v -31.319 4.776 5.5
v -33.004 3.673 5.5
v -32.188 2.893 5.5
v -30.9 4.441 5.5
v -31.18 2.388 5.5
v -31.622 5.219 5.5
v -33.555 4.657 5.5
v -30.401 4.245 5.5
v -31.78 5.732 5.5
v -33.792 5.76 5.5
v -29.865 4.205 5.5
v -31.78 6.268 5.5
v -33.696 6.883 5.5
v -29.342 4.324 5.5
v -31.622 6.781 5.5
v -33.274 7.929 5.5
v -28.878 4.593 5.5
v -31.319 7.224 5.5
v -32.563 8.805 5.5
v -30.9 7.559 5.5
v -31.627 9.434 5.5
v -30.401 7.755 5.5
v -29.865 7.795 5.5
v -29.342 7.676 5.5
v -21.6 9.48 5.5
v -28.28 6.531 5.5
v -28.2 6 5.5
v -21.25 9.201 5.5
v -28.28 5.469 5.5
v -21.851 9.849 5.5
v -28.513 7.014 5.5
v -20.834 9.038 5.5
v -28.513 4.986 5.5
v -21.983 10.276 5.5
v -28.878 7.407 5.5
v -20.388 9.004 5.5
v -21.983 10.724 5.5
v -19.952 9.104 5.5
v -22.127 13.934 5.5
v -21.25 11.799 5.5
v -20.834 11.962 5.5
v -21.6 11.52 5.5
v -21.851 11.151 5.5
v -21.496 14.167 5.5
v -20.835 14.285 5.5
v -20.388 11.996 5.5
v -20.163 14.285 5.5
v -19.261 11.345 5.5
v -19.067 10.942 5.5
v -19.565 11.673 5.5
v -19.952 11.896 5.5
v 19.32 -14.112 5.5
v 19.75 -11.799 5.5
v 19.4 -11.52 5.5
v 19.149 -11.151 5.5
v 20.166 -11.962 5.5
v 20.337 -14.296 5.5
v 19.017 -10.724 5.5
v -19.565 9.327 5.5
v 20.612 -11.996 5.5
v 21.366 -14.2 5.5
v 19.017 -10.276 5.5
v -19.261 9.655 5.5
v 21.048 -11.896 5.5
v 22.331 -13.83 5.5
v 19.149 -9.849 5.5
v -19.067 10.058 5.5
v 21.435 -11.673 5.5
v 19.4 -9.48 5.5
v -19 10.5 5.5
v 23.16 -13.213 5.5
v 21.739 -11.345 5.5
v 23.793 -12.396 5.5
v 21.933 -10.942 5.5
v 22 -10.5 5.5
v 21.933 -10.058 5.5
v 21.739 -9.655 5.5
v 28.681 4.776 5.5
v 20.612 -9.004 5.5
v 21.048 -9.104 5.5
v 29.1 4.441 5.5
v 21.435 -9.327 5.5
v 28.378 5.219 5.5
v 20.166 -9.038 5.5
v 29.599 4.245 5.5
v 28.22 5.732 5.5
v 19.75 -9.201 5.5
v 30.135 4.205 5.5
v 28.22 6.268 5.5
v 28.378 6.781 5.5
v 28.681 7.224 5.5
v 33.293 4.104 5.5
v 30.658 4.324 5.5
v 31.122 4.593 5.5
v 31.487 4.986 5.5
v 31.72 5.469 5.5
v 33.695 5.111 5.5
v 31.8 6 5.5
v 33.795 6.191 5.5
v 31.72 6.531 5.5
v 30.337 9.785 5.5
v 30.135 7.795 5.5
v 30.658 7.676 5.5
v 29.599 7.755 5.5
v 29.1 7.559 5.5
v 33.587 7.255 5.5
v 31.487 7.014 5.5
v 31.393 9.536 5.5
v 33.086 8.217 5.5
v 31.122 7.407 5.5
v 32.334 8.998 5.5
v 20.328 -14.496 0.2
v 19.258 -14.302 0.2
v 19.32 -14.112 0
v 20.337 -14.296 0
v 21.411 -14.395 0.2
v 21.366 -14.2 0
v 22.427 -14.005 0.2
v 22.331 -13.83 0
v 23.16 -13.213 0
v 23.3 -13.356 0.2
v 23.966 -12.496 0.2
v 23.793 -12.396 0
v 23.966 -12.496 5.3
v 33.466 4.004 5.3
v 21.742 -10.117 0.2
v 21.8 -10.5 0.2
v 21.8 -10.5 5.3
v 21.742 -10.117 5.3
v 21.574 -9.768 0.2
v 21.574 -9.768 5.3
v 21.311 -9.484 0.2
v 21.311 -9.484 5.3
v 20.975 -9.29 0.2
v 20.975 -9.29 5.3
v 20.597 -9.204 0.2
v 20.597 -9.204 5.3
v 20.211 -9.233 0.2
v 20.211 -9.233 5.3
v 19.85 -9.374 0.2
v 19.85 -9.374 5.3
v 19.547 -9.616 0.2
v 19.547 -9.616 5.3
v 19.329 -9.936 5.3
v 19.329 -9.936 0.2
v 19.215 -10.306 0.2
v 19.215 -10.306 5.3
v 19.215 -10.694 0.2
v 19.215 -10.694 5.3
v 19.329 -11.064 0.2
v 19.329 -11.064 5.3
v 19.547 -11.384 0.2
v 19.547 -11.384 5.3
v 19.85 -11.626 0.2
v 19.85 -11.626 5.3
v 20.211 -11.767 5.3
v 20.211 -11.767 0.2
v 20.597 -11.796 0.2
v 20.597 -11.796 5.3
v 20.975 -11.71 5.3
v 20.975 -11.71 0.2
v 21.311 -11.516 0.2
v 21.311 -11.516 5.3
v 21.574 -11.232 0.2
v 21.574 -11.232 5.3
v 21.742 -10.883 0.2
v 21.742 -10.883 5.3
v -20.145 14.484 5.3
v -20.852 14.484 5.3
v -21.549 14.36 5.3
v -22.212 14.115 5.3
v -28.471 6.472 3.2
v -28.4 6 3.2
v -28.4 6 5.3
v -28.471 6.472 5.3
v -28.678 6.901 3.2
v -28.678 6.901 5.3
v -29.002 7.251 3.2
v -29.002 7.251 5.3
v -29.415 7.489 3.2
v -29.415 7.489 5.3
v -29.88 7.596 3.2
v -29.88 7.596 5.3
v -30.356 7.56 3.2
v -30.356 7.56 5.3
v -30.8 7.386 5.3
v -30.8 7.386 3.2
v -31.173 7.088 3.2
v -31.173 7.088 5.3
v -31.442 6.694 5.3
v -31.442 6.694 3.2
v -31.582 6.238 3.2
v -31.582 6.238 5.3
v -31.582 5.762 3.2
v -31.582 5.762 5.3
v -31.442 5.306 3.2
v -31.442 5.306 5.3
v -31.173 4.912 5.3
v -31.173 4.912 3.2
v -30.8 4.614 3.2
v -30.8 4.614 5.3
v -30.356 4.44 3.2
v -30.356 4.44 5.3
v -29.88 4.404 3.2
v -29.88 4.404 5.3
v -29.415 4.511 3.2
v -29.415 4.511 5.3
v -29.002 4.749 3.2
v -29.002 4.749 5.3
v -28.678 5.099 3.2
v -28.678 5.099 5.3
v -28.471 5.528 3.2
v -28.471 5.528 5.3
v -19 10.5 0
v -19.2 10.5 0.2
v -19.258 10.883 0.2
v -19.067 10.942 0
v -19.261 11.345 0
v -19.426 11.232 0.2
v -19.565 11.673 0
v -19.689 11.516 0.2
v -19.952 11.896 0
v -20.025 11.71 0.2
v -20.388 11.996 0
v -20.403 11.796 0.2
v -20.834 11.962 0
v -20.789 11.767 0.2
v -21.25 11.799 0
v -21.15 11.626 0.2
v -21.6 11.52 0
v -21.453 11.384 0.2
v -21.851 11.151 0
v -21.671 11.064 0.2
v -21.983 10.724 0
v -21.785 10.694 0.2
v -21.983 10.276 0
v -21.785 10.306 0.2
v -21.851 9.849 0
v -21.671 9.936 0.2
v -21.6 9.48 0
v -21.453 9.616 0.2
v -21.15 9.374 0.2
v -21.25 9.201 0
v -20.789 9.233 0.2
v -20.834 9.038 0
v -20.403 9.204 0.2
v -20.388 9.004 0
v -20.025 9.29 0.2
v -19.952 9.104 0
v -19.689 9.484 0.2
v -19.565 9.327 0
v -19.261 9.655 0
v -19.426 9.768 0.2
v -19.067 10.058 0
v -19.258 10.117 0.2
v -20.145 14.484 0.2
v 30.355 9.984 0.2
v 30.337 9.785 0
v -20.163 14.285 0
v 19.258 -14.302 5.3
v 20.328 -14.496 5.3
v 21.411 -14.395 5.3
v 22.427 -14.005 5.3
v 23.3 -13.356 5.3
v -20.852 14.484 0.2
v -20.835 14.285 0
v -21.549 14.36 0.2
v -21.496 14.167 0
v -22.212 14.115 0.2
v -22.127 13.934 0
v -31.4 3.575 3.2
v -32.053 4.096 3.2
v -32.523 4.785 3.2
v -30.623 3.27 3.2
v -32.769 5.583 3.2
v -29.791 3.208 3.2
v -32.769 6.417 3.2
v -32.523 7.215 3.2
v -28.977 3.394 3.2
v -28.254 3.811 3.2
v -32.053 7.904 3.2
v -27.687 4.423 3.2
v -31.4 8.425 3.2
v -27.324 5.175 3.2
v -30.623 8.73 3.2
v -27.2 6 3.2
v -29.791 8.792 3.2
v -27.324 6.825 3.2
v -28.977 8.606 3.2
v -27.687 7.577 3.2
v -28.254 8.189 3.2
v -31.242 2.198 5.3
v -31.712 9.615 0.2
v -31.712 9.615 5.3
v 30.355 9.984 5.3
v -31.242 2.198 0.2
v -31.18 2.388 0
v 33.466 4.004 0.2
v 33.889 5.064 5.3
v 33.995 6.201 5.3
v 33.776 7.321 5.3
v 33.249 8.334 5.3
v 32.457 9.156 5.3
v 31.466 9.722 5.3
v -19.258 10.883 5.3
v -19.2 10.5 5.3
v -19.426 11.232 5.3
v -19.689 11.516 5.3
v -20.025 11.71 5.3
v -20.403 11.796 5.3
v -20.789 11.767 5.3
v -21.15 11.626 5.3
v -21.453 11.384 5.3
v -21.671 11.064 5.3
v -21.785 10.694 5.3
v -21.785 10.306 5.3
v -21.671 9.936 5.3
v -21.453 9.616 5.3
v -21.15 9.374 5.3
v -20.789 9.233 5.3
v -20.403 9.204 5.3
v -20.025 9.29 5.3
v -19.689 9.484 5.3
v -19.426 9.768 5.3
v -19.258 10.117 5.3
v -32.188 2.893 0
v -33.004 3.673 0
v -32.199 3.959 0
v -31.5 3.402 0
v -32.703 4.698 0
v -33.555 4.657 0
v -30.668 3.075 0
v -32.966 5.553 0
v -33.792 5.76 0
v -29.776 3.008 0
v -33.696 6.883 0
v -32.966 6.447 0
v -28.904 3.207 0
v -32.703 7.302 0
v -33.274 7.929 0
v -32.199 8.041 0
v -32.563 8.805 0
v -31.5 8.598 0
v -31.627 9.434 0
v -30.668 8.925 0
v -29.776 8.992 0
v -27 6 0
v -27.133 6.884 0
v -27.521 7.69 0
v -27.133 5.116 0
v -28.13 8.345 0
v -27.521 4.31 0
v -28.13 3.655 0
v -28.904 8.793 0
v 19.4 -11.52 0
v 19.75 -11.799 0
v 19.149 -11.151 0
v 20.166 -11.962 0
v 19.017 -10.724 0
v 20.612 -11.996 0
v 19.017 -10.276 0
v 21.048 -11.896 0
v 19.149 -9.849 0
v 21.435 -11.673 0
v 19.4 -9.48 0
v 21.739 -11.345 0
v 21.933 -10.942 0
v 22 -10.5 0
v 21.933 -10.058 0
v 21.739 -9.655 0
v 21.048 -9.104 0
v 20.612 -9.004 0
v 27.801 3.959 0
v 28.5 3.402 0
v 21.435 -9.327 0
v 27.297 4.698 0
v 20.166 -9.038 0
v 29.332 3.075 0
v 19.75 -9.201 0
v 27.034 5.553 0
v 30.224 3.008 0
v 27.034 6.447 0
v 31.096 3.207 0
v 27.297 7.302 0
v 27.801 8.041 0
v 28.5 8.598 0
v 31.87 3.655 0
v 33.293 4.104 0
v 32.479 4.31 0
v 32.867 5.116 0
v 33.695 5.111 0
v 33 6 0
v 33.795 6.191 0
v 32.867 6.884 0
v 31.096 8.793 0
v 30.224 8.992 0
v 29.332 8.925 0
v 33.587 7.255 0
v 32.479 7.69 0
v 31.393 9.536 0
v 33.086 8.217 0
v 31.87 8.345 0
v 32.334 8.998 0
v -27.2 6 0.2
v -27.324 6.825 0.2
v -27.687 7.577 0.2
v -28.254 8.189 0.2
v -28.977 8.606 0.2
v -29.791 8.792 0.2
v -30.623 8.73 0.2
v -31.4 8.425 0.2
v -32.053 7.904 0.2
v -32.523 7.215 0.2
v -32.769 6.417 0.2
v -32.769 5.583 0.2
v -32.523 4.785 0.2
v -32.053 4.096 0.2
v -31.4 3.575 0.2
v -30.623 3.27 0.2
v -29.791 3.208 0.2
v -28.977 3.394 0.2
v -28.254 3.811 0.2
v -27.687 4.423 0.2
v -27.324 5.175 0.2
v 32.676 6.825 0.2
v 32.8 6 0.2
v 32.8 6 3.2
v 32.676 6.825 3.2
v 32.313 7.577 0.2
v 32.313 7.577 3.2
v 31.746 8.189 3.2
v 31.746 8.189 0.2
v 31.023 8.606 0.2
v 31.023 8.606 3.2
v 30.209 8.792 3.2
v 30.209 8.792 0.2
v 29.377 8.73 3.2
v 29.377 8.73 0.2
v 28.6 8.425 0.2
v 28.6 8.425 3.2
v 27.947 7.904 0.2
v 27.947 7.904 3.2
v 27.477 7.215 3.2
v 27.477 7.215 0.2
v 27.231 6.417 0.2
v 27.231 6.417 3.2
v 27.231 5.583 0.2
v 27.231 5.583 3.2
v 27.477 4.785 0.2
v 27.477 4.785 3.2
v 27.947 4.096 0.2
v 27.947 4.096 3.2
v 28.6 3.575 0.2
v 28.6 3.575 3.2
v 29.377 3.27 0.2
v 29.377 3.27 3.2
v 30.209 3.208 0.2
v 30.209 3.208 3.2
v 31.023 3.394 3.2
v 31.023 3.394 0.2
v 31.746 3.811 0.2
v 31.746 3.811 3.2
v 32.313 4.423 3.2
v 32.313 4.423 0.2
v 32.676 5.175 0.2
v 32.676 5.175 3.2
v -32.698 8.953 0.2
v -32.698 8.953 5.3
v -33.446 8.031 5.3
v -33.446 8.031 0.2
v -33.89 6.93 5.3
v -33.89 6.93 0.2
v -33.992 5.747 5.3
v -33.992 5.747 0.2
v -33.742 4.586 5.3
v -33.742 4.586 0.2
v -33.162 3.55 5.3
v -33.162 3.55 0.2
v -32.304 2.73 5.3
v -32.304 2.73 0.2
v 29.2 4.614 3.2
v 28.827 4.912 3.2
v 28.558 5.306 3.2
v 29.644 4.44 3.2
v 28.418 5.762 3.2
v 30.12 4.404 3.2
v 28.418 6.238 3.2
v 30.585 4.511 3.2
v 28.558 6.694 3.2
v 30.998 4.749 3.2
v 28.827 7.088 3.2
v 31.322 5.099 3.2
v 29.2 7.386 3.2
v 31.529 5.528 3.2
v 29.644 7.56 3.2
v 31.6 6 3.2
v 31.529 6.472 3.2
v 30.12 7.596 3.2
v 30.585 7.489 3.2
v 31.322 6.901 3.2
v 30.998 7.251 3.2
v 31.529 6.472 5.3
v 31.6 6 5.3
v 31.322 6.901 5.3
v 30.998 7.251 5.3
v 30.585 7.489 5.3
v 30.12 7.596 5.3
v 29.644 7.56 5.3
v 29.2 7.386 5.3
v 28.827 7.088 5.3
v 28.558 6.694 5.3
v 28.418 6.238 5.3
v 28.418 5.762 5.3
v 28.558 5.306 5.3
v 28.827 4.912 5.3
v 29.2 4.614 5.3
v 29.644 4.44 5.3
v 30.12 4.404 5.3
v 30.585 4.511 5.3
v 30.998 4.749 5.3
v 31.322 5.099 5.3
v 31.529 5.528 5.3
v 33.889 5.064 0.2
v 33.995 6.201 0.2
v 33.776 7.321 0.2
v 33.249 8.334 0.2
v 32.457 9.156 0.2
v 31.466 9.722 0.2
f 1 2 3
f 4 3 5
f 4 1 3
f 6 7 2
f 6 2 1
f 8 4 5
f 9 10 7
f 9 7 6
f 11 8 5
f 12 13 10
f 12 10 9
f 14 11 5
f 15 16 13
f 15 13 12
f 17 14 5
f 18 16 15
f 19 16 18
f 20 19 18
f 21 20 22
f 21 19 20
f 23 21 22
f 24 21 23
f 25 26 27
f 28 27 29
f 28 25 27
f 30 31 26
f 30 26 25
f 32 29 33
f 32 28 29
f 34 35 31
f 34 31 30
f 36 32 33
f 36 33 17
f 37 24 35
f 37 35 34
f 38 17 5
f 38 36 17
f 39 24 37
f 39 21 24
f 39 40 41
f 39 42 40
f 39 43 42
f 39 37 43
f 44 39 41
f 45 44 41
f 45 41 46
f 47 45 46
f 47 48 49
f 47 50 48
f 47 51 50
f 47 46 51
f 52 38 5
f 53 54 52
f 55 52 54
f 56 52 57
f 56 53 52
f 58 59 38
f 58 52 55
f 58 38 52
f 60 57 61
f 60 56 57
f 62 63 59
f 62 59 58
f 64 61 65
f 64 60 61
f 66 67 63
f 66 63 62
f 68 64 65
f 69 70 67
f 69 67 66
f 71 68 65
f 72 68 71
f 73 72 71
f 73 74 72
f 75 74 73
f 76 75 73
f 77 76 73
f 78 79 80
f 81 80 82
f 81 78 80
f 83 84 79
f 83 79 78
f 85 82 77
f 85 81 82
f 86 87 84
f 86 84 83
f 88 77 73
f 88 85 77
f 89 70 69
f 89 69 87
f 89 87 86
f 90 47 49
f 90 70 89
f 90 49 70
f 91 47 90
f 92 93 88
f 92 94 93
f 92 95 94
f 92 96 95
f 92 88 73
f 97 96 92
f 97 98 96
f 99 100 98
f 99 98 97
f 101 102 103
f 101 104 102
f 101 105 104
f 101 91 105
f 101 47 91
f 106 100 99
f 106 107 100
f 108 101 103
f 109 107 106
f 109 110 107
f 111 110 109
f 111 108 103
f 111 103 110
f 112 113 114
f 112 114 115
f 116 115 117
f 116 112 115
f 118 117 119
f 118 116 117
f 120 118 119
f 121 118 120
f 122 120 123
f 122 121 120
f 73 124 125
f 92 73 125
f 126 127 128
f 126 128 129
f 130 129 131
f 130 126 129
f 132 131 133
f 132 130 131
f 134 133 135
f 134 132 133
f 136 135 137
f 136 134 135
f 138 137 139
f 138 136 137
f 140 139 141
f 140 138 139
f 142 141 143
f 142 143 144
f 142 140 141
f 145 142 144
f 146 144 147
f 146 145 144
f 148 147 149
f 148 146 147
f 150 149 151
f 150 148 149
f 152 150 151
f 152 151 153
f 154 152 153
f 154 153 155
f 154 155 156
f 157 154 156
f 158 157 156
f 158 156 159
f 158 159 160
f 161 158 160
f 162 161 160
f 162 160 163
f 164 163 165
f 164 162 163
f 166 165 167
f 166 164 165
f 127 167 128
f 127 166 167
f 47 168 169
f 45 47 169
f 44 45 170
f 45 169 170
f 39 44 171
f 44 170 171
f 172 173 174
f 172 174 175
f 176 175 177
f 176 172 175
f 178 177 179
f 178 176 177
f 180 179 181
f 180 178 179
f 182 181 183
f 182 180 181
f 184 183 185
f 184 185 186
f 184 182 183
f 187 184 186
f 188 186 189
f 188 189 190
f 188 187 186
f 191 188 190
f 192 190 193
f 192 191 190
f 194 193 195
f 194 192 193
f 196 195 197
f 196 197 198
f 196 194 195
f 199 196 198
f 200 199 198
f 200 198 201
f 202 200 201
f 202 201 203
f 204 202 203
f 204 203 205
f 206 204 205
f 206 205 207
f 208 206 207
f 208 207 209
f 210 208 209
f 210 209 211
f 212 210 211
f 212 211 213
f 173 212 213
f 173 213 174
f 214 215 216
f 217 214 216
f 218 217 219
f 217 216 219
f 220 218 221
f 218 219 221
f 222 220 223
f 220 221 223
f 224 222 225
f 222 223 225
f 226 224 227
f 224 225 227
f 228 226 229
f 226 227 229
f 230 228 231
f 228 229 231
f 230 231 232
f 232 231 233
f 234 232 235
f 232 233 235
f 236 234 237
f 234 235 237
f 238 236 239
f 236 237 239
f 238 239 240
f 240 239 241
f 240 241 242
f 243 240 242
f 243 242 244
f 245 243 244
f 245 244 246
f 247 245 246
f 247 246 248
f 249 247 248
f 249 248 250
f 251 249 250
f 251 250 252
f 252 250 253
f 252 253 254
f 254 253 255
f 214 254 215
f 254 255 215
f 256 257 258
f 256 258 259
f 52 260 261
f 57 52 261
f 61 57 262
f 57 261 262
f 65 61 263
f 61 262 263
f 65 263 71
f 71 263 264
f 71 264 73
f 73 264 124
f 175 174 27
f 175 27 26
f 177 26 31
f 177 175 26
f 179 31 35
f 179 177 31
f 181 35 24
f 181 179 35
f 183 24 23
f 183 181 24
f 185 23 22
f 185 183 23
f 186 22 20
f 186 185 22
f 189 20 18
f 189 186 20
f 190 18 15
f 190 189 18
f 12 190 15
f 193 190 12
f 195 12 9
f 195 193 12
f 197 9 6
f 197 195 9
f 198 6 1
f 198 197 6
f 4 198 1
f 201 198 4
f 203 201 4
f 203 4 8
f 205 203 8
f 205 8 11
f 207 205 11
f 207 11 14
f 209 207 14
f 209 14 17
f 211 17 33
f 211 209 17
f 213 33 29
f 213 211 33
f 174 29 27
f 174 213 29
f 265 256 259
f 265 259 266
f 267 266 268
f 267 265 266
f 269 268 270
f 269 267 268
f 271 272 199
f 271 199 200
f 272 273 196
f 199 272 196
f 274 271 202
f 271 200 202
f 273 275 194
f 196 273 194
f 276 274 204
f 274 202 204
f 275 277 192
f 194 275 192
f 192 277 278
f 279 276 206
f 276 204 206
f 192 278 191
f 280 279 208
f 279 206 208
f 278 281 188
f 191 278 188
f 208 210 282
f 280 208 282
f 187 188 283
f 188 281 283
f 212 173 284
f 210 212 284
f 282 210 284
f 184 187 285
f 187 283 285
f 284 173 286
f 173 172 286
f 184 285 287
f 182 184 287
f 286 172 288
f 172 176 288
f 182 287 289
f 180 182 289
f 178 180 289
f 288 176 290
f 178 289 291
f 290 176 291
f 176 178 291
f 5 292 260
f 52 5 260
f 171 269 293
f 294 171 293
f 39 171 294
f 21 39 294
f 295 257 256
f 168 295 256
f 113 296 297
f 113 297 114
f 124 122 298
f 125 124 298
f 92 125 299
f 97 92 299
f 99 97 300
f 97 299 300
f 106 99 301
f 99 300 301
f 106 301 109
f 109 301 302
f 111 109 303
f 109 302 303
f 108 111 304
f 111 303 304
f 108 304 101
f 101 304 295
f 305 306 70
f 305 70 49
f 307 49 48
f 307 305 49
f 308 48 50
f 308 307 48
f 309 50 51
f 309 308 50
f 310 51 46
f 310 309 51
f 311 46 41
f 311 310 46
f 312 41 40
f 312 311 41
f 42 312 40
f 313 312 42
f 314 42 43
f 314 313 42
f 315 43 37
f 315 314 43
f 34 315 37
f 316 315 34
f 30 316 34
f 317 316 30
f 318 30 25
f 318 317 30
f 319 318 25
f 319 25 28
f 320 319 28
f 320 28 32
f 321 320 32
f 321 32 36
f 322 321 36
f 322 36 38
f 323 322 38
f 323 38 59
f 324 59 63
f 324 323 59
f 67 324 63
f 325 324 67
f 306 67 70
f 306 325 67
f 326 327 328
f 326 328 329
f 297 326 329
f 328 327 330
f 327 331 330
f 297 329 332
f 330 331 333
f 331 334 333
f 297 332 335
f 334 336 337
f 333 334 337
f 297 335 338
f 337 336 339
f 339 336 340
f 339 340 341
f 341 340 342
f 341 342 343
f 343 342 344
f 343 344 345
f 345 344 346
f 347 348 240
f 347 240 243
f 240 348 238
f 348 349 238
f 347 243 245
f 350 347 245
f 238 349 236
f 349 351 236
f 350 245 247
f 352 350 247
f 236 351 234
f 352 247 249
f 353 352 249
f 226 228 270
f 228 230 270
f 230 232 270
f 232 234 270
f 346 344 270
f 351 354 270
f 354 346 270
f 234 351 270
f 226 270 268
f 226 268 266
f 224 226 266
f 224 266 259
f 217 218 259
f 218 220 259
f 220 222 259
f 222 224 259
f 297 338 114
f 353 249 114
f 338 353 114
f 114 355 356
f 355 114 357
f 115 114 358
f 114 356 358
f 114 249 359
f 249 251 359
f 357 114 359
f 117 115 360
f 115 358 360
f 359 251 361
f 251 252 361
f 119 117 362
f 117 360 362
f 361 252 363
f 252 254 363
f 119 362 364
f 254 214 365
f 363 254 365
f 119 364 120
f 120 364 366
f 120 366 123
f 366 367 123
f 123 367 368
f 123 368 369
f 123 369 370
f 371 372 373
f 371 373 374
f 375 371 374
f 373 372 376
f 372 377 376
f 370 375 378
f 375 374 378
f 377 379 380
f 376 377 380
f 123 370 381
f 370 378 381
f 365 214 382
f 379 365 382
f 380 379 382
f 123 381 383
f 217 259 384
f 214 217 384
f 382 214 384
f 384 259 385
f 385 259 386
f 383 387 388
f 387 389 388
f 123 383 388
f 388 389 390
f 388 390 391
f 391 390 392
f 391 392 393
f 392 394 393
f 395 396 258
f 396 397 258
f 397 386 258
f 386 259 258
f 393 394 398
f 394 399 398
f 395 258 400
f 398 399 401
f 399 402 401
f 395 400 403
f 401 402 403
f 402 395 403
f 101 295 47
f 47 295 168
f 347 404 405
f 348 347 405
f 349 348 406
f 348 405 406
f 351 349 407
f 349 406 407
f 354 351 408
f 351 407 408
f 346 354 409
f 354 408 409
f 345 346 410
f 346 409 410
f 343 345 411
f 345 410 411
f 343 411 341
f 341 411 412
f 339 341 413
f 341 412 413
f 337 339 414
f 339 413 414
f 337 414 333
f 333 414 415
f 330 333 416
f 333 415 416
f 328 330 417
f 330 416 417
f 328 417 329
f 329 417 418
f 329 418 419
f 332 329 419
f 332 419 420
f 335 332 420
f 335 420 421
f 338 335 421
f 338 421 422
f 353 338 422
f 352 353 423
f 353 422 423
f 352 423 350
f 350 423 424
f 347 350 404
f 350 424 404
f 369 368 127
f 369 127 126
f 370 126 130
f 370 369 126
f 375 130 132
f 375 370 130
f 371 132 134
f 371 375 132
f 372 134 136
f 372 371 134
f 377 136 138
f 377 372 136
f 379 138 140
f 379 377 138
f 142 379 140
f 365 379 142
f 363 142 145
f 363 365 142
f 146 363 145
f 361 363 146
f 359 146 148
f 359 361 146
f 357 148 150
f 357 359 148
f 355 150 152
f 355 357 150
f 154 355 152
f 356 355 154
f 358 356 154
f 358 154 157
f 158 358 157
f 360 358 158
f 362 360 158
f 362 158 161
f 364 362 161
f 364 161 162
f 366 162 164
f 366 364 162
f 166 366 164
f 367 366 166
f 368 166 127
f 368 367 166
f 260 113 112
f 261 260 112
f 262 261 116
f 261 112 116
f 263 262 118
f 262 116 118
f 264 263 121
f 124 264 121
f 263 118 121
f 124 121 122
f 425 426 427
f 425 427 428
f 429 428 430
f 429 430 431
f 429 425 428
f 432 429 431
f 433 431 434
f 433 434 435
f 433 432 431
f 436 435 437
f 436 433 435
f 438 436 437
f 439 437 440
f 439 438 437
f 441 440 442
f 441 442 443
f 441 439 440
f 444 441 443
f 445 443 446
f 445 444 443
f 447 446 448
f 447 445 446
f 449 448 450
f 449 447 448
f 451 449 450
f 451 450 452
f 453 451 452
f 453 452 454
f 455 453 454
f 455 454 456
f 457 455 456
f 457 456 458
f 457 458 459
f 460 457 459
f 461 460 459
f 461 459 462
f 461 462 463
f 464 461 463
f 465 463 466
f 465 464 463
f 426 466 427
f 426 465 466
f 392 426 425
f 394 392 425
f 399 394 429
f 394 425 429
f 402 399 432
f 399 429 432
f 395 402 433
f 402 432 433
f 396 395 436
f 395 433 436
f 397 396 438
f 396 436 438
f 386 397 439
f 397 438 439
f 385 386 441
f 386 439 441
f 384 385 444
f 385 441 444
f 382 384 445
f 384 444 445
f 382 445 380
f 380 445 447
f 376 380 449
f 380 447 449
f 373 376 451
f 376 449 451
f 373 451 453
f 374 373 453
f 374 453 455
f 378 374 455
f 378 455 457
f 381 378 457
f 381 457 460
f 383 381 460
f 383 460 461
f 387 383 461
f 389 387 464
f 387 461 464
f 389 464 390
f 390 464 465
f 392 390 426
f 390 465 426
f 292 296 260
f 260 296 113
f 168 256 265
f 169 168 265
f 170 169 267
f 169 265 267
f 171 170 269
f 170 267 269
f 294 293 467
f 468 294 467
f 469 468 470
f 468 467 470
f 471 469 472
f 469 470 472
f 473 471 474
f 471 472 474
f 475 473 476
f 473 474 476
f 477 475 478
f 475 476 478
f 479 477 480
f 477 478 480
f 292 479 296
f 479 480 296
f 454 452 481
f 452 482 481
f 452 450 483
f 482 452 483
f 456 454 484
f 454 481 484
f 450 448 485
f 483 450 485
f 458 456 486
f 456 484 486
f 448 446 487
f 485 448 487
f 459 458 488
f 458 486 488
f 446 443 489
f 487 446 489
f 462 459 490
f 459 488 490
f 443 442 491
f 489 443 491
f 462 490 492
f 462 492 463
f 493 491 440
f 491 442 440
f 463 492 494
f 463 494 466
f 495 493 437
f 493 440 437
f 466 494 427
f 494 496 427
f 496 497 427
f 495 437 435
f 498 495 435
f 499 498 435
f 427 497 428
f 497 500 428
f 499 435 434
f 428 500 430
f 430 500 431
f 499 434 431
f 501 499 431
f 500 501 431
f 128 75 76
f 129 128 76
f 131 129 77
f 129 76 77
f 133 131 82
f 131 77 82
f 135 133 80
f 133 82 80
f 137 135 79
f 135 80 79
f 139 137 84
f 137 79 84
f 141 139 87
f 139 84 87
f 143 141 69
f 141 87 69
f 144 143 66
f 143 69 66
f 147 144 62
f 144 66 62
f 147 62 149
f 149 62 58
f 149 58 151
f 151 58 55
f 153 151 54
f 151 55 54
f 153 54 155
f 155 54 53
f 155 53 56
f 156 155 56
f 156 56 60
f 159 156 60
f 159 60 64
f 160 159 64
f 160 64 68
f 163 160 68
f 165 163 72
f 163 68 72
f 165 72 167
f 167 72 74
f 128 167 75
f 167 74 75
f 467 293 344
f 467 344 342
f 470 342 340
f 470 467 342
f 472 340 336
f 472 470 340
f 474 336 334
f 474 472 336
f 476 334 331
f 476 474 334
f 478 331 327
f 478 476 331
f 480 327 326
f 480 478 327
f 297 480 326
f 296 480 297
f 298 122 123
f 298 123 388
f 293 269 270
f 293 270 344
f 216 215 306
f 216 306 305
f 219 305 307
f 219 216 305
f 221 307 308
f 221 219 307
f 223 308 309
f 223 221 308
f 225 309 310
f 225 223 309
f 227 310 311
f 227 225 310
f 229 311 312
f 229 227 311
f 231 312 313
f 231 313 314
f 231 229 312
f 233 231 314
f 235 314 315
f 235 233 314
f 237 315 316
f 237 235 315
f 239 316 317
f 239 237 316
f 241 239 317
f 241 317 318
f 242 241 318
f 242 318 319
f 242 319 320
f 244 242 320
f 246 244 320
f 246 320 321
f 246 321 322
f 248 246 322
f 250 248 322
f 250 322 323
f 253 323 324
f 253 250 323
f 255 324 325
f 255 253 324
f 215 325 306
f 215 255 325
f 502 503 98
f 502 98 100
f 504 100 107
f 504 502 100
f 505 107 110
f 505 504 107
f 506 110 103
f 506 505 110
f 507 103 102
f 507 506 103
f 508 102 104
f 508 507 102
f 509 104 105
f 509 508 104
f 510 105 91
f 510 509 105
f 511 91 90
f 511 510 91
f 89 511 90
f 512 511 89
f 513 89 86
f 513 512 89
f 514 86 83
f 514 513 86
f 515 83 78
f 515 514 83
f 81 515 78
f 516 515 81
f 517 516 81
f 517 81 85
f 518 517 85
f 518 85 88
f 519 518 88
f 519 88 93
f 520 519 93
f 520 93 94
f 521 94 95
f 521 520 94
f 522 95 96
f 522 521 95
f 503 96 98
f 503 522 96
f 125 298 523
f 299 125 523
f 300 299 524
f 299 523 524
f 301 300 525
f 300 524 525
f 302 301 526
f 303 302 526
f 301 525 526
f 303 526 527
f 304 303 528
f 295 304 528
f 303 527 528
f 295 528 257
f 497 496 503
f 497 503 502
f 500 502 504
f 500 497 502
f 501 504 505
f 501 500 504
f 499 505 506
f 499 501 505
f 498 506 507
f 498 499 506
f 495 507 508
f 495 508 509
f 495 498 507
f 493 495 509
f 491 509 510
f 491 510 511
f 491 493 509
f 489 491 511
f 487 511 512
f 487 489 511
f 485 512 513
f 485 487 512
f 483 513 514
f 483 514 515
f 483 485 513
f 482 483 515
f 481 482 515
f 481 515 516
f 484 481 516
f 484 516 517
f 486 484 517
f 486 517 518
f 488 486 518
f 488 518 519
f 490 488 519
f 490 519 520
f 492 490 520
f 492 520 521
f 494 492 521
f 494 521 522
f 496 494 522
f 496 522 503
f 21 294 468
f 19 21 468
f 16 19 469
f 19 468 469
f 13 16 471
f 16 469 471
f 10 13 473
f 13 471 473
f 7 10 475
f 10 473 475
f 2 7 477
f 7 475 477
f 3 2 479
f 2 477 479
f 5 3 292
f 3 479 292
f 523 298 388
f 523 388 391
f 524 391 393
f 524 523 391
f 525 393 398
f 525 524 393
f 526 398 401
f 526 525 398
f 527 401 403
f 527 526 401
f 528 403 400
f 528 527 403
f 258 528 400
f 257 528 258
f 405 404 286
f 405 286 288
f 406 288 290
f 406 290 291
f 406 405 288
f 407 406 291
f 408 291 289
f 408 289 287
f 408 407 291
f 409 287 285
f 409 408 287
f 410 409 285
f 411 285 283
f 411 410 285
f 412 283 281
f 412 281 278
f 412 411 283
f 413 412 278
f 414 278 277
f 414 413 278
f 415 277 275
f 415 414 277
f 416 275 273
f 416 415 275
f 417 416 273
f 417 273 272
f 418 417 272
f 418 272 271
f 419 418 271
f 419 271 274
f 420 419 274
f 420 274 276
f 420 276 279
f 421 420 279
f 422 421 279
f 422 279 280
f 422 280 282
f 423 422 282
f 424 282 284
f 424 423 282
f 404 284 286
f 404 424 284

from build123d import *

# Parameters (mm, degrees)
SKETCH1_R           = 4
SKETCH1_R_2         = 1.6
SKETCH1_R_3         = 1.8
SKETCH1_R_4         = 1.3
BOSS_EXTRUDE1_DEPTH = 5.5
SKETCH2_R           = 2.8
CUT_EXTRUDE1_DEPTH  = 3.2
CHAMFER1_SIZE       = 0.2


with BuildPart() as part:
    # Sketch1 → Boss-Extrude1 (new body)
    # profile 1 of 7: a face of its own
    with BuildSketch(Plane.XY):
        with BuildLine():
            Line((30.355028895, 9.984213157), (-20.144971105, 14.484213157))
            ThreePointArc((-20.144971105, 14.484213157), (-17.548719297, 13.199989298), (-16.5, 10.5))
            ThreePointArc((-16.5, 10.5), (-22.638997252, 7.119956989), (-22.212345379, 14.114951356))
            Line((-22.212345379, 14.114951356), (-31.712345379, 9.614951356))
            ThreePointArc((-31.712345379, 9.614951356), (-27.861002748, 9.380043011), (-26, 6))
            ThreePointArc((-26, 6), (-27.651511703, 2.762006375), (-31.242301359, 2.197804932))
            Line((-31.242301359, 2.197804932), (19.257698641, -14.302195068))
            ThreePointArc((19.257698641, -14.302195068), (18.151511703, -7.262006375), (24.5, -10.5))
            ThreePointArc((24.5, -10.5), (24.364321371, -11.532966769), (23.966489827, -12.495857779))
            Line((23.966489827, -12.495857779), (33.466489827, 4.004142221))
            ThreePointArc((33.466489827, 4.004142221), (26.451575922, 4.153737137), (30.355028895, 9.984213157))
        make_face()
    # profile 2 of 7: a face of its own
    with BuildSketch(Plane.XY):
        with Locations((-30, 6)):
            Circle(SKETCH1_R)
        with Locations((-30, 6)):
            Circle(SKETCH1_R_2, mode=Mode.SUBTRACT)
    # profile 3 of 7: a face of its own
    with BuildSketch(Plane.XY):
        with Locations((-20.5, 10.5)):
            Circle(SKETCH1_R)
        with Locations((-20.5, 10.5)):
            Circle(SKETCH1_R_3, mode=Mode.SUBTRACT)
    # profile 4 of 7: a face of its own
    with BuildSketch(Plane.XY):
        with Locations((30, 6)):
            Circle(SKETCH1_R)
        with Locations((30, 6)):
            Circle(SKETCH1_R_2, mode=Mode.SUBTRACT)
    # profile 5 of 7: a face of its own
    with BuildSketch(Plane.XY):
        with Locations((20.5, -10.5)):
            Circle(SKETCH1_R)
        with Locations((20.5, -10.5)):
            Circle(SKETCH1_R_3, mode=Mode.SUBTRACT)
    # profile 6 of 7: a face of its own
    with BuildSketch(Plane.XY):
        with Locations((-20.5, 10.5)):
            Circle(SKETCH1_R_3)
        with Locations((-20.5, 10.5)):
            Circle(SKETCH1_R_4, mode=Mode.SUBTRACT)
    # profile 7 of 7: a face of its own
    with BuildSketch(Plane.XY):
        with Locations((20.5, -10.5)):
            Circle(SKETCH1_R_3)
        with Locations((20.5, -10.5)):
            Circle(SKETCH1_R_4, mode=Mode.SUBTRACT)
    extrude(amount=BOSS_EXTRUDE1_DEPTH)

    # Sketch2 → Cut-Extrude1 (cut)
    with BuildSketch(Plane.XY):
        with Locations((-30, 6)):
            Circle(SKETCH2_R)
        with Locations((30, 6)):
            Circle(SKETCH2_R)
    extrude(amount=CUT_EXTRUDE1_DEPTH, mode=Mode.SUBTRACT)

    # Chamfer1
    chamfer1_edges = [part.edges().sort_by_distance(p)[0] for p in [
        (33.548424078, 7.846262863, 5.5),
        (-21.8, 10.5, 0),
        (19.2, -10.5, 0),
        (21.932643426, -14.234639583, 0),
        (-5.992301359, -6.052195068, 0),
        (-33.991991934, 5.747017002, 0),
        (-26.962345379, 11.864951356, 0),
        (-21.203324661, 14.437681351, 0),
        (5.105028895, 12.234213157, 0),
        (5.105028895, 12.234213157, 5.5),
        (33.548424078, 7.846262863, 0),
        (28.716489827, -4.245857779, 0),
        (-21.203324661, 14.437681351, 5.5),
        (-26.962345379, 11.864951356, 5.5),
        (-33.991991934, 5.747017002, 5.5),
        (-5.992301359, -6.052195068, 5.5),
        (21.932643426, -14.234639583, 5.5),
        (-31.6, 6, 5.5),
        (28.4, 6, 5.5),
        (-32.8, 6, 0),
        (19.2, -10.5, 5.5),
        (27.2, 6, 0),
        (-21.8, 10.5, 5.5),
        (28.716489827, -4.245857779, 5.5),
    ]]
    chamfer(chamfer1_edges, length=CHAMFER1_SIZE)


solid = part.part
